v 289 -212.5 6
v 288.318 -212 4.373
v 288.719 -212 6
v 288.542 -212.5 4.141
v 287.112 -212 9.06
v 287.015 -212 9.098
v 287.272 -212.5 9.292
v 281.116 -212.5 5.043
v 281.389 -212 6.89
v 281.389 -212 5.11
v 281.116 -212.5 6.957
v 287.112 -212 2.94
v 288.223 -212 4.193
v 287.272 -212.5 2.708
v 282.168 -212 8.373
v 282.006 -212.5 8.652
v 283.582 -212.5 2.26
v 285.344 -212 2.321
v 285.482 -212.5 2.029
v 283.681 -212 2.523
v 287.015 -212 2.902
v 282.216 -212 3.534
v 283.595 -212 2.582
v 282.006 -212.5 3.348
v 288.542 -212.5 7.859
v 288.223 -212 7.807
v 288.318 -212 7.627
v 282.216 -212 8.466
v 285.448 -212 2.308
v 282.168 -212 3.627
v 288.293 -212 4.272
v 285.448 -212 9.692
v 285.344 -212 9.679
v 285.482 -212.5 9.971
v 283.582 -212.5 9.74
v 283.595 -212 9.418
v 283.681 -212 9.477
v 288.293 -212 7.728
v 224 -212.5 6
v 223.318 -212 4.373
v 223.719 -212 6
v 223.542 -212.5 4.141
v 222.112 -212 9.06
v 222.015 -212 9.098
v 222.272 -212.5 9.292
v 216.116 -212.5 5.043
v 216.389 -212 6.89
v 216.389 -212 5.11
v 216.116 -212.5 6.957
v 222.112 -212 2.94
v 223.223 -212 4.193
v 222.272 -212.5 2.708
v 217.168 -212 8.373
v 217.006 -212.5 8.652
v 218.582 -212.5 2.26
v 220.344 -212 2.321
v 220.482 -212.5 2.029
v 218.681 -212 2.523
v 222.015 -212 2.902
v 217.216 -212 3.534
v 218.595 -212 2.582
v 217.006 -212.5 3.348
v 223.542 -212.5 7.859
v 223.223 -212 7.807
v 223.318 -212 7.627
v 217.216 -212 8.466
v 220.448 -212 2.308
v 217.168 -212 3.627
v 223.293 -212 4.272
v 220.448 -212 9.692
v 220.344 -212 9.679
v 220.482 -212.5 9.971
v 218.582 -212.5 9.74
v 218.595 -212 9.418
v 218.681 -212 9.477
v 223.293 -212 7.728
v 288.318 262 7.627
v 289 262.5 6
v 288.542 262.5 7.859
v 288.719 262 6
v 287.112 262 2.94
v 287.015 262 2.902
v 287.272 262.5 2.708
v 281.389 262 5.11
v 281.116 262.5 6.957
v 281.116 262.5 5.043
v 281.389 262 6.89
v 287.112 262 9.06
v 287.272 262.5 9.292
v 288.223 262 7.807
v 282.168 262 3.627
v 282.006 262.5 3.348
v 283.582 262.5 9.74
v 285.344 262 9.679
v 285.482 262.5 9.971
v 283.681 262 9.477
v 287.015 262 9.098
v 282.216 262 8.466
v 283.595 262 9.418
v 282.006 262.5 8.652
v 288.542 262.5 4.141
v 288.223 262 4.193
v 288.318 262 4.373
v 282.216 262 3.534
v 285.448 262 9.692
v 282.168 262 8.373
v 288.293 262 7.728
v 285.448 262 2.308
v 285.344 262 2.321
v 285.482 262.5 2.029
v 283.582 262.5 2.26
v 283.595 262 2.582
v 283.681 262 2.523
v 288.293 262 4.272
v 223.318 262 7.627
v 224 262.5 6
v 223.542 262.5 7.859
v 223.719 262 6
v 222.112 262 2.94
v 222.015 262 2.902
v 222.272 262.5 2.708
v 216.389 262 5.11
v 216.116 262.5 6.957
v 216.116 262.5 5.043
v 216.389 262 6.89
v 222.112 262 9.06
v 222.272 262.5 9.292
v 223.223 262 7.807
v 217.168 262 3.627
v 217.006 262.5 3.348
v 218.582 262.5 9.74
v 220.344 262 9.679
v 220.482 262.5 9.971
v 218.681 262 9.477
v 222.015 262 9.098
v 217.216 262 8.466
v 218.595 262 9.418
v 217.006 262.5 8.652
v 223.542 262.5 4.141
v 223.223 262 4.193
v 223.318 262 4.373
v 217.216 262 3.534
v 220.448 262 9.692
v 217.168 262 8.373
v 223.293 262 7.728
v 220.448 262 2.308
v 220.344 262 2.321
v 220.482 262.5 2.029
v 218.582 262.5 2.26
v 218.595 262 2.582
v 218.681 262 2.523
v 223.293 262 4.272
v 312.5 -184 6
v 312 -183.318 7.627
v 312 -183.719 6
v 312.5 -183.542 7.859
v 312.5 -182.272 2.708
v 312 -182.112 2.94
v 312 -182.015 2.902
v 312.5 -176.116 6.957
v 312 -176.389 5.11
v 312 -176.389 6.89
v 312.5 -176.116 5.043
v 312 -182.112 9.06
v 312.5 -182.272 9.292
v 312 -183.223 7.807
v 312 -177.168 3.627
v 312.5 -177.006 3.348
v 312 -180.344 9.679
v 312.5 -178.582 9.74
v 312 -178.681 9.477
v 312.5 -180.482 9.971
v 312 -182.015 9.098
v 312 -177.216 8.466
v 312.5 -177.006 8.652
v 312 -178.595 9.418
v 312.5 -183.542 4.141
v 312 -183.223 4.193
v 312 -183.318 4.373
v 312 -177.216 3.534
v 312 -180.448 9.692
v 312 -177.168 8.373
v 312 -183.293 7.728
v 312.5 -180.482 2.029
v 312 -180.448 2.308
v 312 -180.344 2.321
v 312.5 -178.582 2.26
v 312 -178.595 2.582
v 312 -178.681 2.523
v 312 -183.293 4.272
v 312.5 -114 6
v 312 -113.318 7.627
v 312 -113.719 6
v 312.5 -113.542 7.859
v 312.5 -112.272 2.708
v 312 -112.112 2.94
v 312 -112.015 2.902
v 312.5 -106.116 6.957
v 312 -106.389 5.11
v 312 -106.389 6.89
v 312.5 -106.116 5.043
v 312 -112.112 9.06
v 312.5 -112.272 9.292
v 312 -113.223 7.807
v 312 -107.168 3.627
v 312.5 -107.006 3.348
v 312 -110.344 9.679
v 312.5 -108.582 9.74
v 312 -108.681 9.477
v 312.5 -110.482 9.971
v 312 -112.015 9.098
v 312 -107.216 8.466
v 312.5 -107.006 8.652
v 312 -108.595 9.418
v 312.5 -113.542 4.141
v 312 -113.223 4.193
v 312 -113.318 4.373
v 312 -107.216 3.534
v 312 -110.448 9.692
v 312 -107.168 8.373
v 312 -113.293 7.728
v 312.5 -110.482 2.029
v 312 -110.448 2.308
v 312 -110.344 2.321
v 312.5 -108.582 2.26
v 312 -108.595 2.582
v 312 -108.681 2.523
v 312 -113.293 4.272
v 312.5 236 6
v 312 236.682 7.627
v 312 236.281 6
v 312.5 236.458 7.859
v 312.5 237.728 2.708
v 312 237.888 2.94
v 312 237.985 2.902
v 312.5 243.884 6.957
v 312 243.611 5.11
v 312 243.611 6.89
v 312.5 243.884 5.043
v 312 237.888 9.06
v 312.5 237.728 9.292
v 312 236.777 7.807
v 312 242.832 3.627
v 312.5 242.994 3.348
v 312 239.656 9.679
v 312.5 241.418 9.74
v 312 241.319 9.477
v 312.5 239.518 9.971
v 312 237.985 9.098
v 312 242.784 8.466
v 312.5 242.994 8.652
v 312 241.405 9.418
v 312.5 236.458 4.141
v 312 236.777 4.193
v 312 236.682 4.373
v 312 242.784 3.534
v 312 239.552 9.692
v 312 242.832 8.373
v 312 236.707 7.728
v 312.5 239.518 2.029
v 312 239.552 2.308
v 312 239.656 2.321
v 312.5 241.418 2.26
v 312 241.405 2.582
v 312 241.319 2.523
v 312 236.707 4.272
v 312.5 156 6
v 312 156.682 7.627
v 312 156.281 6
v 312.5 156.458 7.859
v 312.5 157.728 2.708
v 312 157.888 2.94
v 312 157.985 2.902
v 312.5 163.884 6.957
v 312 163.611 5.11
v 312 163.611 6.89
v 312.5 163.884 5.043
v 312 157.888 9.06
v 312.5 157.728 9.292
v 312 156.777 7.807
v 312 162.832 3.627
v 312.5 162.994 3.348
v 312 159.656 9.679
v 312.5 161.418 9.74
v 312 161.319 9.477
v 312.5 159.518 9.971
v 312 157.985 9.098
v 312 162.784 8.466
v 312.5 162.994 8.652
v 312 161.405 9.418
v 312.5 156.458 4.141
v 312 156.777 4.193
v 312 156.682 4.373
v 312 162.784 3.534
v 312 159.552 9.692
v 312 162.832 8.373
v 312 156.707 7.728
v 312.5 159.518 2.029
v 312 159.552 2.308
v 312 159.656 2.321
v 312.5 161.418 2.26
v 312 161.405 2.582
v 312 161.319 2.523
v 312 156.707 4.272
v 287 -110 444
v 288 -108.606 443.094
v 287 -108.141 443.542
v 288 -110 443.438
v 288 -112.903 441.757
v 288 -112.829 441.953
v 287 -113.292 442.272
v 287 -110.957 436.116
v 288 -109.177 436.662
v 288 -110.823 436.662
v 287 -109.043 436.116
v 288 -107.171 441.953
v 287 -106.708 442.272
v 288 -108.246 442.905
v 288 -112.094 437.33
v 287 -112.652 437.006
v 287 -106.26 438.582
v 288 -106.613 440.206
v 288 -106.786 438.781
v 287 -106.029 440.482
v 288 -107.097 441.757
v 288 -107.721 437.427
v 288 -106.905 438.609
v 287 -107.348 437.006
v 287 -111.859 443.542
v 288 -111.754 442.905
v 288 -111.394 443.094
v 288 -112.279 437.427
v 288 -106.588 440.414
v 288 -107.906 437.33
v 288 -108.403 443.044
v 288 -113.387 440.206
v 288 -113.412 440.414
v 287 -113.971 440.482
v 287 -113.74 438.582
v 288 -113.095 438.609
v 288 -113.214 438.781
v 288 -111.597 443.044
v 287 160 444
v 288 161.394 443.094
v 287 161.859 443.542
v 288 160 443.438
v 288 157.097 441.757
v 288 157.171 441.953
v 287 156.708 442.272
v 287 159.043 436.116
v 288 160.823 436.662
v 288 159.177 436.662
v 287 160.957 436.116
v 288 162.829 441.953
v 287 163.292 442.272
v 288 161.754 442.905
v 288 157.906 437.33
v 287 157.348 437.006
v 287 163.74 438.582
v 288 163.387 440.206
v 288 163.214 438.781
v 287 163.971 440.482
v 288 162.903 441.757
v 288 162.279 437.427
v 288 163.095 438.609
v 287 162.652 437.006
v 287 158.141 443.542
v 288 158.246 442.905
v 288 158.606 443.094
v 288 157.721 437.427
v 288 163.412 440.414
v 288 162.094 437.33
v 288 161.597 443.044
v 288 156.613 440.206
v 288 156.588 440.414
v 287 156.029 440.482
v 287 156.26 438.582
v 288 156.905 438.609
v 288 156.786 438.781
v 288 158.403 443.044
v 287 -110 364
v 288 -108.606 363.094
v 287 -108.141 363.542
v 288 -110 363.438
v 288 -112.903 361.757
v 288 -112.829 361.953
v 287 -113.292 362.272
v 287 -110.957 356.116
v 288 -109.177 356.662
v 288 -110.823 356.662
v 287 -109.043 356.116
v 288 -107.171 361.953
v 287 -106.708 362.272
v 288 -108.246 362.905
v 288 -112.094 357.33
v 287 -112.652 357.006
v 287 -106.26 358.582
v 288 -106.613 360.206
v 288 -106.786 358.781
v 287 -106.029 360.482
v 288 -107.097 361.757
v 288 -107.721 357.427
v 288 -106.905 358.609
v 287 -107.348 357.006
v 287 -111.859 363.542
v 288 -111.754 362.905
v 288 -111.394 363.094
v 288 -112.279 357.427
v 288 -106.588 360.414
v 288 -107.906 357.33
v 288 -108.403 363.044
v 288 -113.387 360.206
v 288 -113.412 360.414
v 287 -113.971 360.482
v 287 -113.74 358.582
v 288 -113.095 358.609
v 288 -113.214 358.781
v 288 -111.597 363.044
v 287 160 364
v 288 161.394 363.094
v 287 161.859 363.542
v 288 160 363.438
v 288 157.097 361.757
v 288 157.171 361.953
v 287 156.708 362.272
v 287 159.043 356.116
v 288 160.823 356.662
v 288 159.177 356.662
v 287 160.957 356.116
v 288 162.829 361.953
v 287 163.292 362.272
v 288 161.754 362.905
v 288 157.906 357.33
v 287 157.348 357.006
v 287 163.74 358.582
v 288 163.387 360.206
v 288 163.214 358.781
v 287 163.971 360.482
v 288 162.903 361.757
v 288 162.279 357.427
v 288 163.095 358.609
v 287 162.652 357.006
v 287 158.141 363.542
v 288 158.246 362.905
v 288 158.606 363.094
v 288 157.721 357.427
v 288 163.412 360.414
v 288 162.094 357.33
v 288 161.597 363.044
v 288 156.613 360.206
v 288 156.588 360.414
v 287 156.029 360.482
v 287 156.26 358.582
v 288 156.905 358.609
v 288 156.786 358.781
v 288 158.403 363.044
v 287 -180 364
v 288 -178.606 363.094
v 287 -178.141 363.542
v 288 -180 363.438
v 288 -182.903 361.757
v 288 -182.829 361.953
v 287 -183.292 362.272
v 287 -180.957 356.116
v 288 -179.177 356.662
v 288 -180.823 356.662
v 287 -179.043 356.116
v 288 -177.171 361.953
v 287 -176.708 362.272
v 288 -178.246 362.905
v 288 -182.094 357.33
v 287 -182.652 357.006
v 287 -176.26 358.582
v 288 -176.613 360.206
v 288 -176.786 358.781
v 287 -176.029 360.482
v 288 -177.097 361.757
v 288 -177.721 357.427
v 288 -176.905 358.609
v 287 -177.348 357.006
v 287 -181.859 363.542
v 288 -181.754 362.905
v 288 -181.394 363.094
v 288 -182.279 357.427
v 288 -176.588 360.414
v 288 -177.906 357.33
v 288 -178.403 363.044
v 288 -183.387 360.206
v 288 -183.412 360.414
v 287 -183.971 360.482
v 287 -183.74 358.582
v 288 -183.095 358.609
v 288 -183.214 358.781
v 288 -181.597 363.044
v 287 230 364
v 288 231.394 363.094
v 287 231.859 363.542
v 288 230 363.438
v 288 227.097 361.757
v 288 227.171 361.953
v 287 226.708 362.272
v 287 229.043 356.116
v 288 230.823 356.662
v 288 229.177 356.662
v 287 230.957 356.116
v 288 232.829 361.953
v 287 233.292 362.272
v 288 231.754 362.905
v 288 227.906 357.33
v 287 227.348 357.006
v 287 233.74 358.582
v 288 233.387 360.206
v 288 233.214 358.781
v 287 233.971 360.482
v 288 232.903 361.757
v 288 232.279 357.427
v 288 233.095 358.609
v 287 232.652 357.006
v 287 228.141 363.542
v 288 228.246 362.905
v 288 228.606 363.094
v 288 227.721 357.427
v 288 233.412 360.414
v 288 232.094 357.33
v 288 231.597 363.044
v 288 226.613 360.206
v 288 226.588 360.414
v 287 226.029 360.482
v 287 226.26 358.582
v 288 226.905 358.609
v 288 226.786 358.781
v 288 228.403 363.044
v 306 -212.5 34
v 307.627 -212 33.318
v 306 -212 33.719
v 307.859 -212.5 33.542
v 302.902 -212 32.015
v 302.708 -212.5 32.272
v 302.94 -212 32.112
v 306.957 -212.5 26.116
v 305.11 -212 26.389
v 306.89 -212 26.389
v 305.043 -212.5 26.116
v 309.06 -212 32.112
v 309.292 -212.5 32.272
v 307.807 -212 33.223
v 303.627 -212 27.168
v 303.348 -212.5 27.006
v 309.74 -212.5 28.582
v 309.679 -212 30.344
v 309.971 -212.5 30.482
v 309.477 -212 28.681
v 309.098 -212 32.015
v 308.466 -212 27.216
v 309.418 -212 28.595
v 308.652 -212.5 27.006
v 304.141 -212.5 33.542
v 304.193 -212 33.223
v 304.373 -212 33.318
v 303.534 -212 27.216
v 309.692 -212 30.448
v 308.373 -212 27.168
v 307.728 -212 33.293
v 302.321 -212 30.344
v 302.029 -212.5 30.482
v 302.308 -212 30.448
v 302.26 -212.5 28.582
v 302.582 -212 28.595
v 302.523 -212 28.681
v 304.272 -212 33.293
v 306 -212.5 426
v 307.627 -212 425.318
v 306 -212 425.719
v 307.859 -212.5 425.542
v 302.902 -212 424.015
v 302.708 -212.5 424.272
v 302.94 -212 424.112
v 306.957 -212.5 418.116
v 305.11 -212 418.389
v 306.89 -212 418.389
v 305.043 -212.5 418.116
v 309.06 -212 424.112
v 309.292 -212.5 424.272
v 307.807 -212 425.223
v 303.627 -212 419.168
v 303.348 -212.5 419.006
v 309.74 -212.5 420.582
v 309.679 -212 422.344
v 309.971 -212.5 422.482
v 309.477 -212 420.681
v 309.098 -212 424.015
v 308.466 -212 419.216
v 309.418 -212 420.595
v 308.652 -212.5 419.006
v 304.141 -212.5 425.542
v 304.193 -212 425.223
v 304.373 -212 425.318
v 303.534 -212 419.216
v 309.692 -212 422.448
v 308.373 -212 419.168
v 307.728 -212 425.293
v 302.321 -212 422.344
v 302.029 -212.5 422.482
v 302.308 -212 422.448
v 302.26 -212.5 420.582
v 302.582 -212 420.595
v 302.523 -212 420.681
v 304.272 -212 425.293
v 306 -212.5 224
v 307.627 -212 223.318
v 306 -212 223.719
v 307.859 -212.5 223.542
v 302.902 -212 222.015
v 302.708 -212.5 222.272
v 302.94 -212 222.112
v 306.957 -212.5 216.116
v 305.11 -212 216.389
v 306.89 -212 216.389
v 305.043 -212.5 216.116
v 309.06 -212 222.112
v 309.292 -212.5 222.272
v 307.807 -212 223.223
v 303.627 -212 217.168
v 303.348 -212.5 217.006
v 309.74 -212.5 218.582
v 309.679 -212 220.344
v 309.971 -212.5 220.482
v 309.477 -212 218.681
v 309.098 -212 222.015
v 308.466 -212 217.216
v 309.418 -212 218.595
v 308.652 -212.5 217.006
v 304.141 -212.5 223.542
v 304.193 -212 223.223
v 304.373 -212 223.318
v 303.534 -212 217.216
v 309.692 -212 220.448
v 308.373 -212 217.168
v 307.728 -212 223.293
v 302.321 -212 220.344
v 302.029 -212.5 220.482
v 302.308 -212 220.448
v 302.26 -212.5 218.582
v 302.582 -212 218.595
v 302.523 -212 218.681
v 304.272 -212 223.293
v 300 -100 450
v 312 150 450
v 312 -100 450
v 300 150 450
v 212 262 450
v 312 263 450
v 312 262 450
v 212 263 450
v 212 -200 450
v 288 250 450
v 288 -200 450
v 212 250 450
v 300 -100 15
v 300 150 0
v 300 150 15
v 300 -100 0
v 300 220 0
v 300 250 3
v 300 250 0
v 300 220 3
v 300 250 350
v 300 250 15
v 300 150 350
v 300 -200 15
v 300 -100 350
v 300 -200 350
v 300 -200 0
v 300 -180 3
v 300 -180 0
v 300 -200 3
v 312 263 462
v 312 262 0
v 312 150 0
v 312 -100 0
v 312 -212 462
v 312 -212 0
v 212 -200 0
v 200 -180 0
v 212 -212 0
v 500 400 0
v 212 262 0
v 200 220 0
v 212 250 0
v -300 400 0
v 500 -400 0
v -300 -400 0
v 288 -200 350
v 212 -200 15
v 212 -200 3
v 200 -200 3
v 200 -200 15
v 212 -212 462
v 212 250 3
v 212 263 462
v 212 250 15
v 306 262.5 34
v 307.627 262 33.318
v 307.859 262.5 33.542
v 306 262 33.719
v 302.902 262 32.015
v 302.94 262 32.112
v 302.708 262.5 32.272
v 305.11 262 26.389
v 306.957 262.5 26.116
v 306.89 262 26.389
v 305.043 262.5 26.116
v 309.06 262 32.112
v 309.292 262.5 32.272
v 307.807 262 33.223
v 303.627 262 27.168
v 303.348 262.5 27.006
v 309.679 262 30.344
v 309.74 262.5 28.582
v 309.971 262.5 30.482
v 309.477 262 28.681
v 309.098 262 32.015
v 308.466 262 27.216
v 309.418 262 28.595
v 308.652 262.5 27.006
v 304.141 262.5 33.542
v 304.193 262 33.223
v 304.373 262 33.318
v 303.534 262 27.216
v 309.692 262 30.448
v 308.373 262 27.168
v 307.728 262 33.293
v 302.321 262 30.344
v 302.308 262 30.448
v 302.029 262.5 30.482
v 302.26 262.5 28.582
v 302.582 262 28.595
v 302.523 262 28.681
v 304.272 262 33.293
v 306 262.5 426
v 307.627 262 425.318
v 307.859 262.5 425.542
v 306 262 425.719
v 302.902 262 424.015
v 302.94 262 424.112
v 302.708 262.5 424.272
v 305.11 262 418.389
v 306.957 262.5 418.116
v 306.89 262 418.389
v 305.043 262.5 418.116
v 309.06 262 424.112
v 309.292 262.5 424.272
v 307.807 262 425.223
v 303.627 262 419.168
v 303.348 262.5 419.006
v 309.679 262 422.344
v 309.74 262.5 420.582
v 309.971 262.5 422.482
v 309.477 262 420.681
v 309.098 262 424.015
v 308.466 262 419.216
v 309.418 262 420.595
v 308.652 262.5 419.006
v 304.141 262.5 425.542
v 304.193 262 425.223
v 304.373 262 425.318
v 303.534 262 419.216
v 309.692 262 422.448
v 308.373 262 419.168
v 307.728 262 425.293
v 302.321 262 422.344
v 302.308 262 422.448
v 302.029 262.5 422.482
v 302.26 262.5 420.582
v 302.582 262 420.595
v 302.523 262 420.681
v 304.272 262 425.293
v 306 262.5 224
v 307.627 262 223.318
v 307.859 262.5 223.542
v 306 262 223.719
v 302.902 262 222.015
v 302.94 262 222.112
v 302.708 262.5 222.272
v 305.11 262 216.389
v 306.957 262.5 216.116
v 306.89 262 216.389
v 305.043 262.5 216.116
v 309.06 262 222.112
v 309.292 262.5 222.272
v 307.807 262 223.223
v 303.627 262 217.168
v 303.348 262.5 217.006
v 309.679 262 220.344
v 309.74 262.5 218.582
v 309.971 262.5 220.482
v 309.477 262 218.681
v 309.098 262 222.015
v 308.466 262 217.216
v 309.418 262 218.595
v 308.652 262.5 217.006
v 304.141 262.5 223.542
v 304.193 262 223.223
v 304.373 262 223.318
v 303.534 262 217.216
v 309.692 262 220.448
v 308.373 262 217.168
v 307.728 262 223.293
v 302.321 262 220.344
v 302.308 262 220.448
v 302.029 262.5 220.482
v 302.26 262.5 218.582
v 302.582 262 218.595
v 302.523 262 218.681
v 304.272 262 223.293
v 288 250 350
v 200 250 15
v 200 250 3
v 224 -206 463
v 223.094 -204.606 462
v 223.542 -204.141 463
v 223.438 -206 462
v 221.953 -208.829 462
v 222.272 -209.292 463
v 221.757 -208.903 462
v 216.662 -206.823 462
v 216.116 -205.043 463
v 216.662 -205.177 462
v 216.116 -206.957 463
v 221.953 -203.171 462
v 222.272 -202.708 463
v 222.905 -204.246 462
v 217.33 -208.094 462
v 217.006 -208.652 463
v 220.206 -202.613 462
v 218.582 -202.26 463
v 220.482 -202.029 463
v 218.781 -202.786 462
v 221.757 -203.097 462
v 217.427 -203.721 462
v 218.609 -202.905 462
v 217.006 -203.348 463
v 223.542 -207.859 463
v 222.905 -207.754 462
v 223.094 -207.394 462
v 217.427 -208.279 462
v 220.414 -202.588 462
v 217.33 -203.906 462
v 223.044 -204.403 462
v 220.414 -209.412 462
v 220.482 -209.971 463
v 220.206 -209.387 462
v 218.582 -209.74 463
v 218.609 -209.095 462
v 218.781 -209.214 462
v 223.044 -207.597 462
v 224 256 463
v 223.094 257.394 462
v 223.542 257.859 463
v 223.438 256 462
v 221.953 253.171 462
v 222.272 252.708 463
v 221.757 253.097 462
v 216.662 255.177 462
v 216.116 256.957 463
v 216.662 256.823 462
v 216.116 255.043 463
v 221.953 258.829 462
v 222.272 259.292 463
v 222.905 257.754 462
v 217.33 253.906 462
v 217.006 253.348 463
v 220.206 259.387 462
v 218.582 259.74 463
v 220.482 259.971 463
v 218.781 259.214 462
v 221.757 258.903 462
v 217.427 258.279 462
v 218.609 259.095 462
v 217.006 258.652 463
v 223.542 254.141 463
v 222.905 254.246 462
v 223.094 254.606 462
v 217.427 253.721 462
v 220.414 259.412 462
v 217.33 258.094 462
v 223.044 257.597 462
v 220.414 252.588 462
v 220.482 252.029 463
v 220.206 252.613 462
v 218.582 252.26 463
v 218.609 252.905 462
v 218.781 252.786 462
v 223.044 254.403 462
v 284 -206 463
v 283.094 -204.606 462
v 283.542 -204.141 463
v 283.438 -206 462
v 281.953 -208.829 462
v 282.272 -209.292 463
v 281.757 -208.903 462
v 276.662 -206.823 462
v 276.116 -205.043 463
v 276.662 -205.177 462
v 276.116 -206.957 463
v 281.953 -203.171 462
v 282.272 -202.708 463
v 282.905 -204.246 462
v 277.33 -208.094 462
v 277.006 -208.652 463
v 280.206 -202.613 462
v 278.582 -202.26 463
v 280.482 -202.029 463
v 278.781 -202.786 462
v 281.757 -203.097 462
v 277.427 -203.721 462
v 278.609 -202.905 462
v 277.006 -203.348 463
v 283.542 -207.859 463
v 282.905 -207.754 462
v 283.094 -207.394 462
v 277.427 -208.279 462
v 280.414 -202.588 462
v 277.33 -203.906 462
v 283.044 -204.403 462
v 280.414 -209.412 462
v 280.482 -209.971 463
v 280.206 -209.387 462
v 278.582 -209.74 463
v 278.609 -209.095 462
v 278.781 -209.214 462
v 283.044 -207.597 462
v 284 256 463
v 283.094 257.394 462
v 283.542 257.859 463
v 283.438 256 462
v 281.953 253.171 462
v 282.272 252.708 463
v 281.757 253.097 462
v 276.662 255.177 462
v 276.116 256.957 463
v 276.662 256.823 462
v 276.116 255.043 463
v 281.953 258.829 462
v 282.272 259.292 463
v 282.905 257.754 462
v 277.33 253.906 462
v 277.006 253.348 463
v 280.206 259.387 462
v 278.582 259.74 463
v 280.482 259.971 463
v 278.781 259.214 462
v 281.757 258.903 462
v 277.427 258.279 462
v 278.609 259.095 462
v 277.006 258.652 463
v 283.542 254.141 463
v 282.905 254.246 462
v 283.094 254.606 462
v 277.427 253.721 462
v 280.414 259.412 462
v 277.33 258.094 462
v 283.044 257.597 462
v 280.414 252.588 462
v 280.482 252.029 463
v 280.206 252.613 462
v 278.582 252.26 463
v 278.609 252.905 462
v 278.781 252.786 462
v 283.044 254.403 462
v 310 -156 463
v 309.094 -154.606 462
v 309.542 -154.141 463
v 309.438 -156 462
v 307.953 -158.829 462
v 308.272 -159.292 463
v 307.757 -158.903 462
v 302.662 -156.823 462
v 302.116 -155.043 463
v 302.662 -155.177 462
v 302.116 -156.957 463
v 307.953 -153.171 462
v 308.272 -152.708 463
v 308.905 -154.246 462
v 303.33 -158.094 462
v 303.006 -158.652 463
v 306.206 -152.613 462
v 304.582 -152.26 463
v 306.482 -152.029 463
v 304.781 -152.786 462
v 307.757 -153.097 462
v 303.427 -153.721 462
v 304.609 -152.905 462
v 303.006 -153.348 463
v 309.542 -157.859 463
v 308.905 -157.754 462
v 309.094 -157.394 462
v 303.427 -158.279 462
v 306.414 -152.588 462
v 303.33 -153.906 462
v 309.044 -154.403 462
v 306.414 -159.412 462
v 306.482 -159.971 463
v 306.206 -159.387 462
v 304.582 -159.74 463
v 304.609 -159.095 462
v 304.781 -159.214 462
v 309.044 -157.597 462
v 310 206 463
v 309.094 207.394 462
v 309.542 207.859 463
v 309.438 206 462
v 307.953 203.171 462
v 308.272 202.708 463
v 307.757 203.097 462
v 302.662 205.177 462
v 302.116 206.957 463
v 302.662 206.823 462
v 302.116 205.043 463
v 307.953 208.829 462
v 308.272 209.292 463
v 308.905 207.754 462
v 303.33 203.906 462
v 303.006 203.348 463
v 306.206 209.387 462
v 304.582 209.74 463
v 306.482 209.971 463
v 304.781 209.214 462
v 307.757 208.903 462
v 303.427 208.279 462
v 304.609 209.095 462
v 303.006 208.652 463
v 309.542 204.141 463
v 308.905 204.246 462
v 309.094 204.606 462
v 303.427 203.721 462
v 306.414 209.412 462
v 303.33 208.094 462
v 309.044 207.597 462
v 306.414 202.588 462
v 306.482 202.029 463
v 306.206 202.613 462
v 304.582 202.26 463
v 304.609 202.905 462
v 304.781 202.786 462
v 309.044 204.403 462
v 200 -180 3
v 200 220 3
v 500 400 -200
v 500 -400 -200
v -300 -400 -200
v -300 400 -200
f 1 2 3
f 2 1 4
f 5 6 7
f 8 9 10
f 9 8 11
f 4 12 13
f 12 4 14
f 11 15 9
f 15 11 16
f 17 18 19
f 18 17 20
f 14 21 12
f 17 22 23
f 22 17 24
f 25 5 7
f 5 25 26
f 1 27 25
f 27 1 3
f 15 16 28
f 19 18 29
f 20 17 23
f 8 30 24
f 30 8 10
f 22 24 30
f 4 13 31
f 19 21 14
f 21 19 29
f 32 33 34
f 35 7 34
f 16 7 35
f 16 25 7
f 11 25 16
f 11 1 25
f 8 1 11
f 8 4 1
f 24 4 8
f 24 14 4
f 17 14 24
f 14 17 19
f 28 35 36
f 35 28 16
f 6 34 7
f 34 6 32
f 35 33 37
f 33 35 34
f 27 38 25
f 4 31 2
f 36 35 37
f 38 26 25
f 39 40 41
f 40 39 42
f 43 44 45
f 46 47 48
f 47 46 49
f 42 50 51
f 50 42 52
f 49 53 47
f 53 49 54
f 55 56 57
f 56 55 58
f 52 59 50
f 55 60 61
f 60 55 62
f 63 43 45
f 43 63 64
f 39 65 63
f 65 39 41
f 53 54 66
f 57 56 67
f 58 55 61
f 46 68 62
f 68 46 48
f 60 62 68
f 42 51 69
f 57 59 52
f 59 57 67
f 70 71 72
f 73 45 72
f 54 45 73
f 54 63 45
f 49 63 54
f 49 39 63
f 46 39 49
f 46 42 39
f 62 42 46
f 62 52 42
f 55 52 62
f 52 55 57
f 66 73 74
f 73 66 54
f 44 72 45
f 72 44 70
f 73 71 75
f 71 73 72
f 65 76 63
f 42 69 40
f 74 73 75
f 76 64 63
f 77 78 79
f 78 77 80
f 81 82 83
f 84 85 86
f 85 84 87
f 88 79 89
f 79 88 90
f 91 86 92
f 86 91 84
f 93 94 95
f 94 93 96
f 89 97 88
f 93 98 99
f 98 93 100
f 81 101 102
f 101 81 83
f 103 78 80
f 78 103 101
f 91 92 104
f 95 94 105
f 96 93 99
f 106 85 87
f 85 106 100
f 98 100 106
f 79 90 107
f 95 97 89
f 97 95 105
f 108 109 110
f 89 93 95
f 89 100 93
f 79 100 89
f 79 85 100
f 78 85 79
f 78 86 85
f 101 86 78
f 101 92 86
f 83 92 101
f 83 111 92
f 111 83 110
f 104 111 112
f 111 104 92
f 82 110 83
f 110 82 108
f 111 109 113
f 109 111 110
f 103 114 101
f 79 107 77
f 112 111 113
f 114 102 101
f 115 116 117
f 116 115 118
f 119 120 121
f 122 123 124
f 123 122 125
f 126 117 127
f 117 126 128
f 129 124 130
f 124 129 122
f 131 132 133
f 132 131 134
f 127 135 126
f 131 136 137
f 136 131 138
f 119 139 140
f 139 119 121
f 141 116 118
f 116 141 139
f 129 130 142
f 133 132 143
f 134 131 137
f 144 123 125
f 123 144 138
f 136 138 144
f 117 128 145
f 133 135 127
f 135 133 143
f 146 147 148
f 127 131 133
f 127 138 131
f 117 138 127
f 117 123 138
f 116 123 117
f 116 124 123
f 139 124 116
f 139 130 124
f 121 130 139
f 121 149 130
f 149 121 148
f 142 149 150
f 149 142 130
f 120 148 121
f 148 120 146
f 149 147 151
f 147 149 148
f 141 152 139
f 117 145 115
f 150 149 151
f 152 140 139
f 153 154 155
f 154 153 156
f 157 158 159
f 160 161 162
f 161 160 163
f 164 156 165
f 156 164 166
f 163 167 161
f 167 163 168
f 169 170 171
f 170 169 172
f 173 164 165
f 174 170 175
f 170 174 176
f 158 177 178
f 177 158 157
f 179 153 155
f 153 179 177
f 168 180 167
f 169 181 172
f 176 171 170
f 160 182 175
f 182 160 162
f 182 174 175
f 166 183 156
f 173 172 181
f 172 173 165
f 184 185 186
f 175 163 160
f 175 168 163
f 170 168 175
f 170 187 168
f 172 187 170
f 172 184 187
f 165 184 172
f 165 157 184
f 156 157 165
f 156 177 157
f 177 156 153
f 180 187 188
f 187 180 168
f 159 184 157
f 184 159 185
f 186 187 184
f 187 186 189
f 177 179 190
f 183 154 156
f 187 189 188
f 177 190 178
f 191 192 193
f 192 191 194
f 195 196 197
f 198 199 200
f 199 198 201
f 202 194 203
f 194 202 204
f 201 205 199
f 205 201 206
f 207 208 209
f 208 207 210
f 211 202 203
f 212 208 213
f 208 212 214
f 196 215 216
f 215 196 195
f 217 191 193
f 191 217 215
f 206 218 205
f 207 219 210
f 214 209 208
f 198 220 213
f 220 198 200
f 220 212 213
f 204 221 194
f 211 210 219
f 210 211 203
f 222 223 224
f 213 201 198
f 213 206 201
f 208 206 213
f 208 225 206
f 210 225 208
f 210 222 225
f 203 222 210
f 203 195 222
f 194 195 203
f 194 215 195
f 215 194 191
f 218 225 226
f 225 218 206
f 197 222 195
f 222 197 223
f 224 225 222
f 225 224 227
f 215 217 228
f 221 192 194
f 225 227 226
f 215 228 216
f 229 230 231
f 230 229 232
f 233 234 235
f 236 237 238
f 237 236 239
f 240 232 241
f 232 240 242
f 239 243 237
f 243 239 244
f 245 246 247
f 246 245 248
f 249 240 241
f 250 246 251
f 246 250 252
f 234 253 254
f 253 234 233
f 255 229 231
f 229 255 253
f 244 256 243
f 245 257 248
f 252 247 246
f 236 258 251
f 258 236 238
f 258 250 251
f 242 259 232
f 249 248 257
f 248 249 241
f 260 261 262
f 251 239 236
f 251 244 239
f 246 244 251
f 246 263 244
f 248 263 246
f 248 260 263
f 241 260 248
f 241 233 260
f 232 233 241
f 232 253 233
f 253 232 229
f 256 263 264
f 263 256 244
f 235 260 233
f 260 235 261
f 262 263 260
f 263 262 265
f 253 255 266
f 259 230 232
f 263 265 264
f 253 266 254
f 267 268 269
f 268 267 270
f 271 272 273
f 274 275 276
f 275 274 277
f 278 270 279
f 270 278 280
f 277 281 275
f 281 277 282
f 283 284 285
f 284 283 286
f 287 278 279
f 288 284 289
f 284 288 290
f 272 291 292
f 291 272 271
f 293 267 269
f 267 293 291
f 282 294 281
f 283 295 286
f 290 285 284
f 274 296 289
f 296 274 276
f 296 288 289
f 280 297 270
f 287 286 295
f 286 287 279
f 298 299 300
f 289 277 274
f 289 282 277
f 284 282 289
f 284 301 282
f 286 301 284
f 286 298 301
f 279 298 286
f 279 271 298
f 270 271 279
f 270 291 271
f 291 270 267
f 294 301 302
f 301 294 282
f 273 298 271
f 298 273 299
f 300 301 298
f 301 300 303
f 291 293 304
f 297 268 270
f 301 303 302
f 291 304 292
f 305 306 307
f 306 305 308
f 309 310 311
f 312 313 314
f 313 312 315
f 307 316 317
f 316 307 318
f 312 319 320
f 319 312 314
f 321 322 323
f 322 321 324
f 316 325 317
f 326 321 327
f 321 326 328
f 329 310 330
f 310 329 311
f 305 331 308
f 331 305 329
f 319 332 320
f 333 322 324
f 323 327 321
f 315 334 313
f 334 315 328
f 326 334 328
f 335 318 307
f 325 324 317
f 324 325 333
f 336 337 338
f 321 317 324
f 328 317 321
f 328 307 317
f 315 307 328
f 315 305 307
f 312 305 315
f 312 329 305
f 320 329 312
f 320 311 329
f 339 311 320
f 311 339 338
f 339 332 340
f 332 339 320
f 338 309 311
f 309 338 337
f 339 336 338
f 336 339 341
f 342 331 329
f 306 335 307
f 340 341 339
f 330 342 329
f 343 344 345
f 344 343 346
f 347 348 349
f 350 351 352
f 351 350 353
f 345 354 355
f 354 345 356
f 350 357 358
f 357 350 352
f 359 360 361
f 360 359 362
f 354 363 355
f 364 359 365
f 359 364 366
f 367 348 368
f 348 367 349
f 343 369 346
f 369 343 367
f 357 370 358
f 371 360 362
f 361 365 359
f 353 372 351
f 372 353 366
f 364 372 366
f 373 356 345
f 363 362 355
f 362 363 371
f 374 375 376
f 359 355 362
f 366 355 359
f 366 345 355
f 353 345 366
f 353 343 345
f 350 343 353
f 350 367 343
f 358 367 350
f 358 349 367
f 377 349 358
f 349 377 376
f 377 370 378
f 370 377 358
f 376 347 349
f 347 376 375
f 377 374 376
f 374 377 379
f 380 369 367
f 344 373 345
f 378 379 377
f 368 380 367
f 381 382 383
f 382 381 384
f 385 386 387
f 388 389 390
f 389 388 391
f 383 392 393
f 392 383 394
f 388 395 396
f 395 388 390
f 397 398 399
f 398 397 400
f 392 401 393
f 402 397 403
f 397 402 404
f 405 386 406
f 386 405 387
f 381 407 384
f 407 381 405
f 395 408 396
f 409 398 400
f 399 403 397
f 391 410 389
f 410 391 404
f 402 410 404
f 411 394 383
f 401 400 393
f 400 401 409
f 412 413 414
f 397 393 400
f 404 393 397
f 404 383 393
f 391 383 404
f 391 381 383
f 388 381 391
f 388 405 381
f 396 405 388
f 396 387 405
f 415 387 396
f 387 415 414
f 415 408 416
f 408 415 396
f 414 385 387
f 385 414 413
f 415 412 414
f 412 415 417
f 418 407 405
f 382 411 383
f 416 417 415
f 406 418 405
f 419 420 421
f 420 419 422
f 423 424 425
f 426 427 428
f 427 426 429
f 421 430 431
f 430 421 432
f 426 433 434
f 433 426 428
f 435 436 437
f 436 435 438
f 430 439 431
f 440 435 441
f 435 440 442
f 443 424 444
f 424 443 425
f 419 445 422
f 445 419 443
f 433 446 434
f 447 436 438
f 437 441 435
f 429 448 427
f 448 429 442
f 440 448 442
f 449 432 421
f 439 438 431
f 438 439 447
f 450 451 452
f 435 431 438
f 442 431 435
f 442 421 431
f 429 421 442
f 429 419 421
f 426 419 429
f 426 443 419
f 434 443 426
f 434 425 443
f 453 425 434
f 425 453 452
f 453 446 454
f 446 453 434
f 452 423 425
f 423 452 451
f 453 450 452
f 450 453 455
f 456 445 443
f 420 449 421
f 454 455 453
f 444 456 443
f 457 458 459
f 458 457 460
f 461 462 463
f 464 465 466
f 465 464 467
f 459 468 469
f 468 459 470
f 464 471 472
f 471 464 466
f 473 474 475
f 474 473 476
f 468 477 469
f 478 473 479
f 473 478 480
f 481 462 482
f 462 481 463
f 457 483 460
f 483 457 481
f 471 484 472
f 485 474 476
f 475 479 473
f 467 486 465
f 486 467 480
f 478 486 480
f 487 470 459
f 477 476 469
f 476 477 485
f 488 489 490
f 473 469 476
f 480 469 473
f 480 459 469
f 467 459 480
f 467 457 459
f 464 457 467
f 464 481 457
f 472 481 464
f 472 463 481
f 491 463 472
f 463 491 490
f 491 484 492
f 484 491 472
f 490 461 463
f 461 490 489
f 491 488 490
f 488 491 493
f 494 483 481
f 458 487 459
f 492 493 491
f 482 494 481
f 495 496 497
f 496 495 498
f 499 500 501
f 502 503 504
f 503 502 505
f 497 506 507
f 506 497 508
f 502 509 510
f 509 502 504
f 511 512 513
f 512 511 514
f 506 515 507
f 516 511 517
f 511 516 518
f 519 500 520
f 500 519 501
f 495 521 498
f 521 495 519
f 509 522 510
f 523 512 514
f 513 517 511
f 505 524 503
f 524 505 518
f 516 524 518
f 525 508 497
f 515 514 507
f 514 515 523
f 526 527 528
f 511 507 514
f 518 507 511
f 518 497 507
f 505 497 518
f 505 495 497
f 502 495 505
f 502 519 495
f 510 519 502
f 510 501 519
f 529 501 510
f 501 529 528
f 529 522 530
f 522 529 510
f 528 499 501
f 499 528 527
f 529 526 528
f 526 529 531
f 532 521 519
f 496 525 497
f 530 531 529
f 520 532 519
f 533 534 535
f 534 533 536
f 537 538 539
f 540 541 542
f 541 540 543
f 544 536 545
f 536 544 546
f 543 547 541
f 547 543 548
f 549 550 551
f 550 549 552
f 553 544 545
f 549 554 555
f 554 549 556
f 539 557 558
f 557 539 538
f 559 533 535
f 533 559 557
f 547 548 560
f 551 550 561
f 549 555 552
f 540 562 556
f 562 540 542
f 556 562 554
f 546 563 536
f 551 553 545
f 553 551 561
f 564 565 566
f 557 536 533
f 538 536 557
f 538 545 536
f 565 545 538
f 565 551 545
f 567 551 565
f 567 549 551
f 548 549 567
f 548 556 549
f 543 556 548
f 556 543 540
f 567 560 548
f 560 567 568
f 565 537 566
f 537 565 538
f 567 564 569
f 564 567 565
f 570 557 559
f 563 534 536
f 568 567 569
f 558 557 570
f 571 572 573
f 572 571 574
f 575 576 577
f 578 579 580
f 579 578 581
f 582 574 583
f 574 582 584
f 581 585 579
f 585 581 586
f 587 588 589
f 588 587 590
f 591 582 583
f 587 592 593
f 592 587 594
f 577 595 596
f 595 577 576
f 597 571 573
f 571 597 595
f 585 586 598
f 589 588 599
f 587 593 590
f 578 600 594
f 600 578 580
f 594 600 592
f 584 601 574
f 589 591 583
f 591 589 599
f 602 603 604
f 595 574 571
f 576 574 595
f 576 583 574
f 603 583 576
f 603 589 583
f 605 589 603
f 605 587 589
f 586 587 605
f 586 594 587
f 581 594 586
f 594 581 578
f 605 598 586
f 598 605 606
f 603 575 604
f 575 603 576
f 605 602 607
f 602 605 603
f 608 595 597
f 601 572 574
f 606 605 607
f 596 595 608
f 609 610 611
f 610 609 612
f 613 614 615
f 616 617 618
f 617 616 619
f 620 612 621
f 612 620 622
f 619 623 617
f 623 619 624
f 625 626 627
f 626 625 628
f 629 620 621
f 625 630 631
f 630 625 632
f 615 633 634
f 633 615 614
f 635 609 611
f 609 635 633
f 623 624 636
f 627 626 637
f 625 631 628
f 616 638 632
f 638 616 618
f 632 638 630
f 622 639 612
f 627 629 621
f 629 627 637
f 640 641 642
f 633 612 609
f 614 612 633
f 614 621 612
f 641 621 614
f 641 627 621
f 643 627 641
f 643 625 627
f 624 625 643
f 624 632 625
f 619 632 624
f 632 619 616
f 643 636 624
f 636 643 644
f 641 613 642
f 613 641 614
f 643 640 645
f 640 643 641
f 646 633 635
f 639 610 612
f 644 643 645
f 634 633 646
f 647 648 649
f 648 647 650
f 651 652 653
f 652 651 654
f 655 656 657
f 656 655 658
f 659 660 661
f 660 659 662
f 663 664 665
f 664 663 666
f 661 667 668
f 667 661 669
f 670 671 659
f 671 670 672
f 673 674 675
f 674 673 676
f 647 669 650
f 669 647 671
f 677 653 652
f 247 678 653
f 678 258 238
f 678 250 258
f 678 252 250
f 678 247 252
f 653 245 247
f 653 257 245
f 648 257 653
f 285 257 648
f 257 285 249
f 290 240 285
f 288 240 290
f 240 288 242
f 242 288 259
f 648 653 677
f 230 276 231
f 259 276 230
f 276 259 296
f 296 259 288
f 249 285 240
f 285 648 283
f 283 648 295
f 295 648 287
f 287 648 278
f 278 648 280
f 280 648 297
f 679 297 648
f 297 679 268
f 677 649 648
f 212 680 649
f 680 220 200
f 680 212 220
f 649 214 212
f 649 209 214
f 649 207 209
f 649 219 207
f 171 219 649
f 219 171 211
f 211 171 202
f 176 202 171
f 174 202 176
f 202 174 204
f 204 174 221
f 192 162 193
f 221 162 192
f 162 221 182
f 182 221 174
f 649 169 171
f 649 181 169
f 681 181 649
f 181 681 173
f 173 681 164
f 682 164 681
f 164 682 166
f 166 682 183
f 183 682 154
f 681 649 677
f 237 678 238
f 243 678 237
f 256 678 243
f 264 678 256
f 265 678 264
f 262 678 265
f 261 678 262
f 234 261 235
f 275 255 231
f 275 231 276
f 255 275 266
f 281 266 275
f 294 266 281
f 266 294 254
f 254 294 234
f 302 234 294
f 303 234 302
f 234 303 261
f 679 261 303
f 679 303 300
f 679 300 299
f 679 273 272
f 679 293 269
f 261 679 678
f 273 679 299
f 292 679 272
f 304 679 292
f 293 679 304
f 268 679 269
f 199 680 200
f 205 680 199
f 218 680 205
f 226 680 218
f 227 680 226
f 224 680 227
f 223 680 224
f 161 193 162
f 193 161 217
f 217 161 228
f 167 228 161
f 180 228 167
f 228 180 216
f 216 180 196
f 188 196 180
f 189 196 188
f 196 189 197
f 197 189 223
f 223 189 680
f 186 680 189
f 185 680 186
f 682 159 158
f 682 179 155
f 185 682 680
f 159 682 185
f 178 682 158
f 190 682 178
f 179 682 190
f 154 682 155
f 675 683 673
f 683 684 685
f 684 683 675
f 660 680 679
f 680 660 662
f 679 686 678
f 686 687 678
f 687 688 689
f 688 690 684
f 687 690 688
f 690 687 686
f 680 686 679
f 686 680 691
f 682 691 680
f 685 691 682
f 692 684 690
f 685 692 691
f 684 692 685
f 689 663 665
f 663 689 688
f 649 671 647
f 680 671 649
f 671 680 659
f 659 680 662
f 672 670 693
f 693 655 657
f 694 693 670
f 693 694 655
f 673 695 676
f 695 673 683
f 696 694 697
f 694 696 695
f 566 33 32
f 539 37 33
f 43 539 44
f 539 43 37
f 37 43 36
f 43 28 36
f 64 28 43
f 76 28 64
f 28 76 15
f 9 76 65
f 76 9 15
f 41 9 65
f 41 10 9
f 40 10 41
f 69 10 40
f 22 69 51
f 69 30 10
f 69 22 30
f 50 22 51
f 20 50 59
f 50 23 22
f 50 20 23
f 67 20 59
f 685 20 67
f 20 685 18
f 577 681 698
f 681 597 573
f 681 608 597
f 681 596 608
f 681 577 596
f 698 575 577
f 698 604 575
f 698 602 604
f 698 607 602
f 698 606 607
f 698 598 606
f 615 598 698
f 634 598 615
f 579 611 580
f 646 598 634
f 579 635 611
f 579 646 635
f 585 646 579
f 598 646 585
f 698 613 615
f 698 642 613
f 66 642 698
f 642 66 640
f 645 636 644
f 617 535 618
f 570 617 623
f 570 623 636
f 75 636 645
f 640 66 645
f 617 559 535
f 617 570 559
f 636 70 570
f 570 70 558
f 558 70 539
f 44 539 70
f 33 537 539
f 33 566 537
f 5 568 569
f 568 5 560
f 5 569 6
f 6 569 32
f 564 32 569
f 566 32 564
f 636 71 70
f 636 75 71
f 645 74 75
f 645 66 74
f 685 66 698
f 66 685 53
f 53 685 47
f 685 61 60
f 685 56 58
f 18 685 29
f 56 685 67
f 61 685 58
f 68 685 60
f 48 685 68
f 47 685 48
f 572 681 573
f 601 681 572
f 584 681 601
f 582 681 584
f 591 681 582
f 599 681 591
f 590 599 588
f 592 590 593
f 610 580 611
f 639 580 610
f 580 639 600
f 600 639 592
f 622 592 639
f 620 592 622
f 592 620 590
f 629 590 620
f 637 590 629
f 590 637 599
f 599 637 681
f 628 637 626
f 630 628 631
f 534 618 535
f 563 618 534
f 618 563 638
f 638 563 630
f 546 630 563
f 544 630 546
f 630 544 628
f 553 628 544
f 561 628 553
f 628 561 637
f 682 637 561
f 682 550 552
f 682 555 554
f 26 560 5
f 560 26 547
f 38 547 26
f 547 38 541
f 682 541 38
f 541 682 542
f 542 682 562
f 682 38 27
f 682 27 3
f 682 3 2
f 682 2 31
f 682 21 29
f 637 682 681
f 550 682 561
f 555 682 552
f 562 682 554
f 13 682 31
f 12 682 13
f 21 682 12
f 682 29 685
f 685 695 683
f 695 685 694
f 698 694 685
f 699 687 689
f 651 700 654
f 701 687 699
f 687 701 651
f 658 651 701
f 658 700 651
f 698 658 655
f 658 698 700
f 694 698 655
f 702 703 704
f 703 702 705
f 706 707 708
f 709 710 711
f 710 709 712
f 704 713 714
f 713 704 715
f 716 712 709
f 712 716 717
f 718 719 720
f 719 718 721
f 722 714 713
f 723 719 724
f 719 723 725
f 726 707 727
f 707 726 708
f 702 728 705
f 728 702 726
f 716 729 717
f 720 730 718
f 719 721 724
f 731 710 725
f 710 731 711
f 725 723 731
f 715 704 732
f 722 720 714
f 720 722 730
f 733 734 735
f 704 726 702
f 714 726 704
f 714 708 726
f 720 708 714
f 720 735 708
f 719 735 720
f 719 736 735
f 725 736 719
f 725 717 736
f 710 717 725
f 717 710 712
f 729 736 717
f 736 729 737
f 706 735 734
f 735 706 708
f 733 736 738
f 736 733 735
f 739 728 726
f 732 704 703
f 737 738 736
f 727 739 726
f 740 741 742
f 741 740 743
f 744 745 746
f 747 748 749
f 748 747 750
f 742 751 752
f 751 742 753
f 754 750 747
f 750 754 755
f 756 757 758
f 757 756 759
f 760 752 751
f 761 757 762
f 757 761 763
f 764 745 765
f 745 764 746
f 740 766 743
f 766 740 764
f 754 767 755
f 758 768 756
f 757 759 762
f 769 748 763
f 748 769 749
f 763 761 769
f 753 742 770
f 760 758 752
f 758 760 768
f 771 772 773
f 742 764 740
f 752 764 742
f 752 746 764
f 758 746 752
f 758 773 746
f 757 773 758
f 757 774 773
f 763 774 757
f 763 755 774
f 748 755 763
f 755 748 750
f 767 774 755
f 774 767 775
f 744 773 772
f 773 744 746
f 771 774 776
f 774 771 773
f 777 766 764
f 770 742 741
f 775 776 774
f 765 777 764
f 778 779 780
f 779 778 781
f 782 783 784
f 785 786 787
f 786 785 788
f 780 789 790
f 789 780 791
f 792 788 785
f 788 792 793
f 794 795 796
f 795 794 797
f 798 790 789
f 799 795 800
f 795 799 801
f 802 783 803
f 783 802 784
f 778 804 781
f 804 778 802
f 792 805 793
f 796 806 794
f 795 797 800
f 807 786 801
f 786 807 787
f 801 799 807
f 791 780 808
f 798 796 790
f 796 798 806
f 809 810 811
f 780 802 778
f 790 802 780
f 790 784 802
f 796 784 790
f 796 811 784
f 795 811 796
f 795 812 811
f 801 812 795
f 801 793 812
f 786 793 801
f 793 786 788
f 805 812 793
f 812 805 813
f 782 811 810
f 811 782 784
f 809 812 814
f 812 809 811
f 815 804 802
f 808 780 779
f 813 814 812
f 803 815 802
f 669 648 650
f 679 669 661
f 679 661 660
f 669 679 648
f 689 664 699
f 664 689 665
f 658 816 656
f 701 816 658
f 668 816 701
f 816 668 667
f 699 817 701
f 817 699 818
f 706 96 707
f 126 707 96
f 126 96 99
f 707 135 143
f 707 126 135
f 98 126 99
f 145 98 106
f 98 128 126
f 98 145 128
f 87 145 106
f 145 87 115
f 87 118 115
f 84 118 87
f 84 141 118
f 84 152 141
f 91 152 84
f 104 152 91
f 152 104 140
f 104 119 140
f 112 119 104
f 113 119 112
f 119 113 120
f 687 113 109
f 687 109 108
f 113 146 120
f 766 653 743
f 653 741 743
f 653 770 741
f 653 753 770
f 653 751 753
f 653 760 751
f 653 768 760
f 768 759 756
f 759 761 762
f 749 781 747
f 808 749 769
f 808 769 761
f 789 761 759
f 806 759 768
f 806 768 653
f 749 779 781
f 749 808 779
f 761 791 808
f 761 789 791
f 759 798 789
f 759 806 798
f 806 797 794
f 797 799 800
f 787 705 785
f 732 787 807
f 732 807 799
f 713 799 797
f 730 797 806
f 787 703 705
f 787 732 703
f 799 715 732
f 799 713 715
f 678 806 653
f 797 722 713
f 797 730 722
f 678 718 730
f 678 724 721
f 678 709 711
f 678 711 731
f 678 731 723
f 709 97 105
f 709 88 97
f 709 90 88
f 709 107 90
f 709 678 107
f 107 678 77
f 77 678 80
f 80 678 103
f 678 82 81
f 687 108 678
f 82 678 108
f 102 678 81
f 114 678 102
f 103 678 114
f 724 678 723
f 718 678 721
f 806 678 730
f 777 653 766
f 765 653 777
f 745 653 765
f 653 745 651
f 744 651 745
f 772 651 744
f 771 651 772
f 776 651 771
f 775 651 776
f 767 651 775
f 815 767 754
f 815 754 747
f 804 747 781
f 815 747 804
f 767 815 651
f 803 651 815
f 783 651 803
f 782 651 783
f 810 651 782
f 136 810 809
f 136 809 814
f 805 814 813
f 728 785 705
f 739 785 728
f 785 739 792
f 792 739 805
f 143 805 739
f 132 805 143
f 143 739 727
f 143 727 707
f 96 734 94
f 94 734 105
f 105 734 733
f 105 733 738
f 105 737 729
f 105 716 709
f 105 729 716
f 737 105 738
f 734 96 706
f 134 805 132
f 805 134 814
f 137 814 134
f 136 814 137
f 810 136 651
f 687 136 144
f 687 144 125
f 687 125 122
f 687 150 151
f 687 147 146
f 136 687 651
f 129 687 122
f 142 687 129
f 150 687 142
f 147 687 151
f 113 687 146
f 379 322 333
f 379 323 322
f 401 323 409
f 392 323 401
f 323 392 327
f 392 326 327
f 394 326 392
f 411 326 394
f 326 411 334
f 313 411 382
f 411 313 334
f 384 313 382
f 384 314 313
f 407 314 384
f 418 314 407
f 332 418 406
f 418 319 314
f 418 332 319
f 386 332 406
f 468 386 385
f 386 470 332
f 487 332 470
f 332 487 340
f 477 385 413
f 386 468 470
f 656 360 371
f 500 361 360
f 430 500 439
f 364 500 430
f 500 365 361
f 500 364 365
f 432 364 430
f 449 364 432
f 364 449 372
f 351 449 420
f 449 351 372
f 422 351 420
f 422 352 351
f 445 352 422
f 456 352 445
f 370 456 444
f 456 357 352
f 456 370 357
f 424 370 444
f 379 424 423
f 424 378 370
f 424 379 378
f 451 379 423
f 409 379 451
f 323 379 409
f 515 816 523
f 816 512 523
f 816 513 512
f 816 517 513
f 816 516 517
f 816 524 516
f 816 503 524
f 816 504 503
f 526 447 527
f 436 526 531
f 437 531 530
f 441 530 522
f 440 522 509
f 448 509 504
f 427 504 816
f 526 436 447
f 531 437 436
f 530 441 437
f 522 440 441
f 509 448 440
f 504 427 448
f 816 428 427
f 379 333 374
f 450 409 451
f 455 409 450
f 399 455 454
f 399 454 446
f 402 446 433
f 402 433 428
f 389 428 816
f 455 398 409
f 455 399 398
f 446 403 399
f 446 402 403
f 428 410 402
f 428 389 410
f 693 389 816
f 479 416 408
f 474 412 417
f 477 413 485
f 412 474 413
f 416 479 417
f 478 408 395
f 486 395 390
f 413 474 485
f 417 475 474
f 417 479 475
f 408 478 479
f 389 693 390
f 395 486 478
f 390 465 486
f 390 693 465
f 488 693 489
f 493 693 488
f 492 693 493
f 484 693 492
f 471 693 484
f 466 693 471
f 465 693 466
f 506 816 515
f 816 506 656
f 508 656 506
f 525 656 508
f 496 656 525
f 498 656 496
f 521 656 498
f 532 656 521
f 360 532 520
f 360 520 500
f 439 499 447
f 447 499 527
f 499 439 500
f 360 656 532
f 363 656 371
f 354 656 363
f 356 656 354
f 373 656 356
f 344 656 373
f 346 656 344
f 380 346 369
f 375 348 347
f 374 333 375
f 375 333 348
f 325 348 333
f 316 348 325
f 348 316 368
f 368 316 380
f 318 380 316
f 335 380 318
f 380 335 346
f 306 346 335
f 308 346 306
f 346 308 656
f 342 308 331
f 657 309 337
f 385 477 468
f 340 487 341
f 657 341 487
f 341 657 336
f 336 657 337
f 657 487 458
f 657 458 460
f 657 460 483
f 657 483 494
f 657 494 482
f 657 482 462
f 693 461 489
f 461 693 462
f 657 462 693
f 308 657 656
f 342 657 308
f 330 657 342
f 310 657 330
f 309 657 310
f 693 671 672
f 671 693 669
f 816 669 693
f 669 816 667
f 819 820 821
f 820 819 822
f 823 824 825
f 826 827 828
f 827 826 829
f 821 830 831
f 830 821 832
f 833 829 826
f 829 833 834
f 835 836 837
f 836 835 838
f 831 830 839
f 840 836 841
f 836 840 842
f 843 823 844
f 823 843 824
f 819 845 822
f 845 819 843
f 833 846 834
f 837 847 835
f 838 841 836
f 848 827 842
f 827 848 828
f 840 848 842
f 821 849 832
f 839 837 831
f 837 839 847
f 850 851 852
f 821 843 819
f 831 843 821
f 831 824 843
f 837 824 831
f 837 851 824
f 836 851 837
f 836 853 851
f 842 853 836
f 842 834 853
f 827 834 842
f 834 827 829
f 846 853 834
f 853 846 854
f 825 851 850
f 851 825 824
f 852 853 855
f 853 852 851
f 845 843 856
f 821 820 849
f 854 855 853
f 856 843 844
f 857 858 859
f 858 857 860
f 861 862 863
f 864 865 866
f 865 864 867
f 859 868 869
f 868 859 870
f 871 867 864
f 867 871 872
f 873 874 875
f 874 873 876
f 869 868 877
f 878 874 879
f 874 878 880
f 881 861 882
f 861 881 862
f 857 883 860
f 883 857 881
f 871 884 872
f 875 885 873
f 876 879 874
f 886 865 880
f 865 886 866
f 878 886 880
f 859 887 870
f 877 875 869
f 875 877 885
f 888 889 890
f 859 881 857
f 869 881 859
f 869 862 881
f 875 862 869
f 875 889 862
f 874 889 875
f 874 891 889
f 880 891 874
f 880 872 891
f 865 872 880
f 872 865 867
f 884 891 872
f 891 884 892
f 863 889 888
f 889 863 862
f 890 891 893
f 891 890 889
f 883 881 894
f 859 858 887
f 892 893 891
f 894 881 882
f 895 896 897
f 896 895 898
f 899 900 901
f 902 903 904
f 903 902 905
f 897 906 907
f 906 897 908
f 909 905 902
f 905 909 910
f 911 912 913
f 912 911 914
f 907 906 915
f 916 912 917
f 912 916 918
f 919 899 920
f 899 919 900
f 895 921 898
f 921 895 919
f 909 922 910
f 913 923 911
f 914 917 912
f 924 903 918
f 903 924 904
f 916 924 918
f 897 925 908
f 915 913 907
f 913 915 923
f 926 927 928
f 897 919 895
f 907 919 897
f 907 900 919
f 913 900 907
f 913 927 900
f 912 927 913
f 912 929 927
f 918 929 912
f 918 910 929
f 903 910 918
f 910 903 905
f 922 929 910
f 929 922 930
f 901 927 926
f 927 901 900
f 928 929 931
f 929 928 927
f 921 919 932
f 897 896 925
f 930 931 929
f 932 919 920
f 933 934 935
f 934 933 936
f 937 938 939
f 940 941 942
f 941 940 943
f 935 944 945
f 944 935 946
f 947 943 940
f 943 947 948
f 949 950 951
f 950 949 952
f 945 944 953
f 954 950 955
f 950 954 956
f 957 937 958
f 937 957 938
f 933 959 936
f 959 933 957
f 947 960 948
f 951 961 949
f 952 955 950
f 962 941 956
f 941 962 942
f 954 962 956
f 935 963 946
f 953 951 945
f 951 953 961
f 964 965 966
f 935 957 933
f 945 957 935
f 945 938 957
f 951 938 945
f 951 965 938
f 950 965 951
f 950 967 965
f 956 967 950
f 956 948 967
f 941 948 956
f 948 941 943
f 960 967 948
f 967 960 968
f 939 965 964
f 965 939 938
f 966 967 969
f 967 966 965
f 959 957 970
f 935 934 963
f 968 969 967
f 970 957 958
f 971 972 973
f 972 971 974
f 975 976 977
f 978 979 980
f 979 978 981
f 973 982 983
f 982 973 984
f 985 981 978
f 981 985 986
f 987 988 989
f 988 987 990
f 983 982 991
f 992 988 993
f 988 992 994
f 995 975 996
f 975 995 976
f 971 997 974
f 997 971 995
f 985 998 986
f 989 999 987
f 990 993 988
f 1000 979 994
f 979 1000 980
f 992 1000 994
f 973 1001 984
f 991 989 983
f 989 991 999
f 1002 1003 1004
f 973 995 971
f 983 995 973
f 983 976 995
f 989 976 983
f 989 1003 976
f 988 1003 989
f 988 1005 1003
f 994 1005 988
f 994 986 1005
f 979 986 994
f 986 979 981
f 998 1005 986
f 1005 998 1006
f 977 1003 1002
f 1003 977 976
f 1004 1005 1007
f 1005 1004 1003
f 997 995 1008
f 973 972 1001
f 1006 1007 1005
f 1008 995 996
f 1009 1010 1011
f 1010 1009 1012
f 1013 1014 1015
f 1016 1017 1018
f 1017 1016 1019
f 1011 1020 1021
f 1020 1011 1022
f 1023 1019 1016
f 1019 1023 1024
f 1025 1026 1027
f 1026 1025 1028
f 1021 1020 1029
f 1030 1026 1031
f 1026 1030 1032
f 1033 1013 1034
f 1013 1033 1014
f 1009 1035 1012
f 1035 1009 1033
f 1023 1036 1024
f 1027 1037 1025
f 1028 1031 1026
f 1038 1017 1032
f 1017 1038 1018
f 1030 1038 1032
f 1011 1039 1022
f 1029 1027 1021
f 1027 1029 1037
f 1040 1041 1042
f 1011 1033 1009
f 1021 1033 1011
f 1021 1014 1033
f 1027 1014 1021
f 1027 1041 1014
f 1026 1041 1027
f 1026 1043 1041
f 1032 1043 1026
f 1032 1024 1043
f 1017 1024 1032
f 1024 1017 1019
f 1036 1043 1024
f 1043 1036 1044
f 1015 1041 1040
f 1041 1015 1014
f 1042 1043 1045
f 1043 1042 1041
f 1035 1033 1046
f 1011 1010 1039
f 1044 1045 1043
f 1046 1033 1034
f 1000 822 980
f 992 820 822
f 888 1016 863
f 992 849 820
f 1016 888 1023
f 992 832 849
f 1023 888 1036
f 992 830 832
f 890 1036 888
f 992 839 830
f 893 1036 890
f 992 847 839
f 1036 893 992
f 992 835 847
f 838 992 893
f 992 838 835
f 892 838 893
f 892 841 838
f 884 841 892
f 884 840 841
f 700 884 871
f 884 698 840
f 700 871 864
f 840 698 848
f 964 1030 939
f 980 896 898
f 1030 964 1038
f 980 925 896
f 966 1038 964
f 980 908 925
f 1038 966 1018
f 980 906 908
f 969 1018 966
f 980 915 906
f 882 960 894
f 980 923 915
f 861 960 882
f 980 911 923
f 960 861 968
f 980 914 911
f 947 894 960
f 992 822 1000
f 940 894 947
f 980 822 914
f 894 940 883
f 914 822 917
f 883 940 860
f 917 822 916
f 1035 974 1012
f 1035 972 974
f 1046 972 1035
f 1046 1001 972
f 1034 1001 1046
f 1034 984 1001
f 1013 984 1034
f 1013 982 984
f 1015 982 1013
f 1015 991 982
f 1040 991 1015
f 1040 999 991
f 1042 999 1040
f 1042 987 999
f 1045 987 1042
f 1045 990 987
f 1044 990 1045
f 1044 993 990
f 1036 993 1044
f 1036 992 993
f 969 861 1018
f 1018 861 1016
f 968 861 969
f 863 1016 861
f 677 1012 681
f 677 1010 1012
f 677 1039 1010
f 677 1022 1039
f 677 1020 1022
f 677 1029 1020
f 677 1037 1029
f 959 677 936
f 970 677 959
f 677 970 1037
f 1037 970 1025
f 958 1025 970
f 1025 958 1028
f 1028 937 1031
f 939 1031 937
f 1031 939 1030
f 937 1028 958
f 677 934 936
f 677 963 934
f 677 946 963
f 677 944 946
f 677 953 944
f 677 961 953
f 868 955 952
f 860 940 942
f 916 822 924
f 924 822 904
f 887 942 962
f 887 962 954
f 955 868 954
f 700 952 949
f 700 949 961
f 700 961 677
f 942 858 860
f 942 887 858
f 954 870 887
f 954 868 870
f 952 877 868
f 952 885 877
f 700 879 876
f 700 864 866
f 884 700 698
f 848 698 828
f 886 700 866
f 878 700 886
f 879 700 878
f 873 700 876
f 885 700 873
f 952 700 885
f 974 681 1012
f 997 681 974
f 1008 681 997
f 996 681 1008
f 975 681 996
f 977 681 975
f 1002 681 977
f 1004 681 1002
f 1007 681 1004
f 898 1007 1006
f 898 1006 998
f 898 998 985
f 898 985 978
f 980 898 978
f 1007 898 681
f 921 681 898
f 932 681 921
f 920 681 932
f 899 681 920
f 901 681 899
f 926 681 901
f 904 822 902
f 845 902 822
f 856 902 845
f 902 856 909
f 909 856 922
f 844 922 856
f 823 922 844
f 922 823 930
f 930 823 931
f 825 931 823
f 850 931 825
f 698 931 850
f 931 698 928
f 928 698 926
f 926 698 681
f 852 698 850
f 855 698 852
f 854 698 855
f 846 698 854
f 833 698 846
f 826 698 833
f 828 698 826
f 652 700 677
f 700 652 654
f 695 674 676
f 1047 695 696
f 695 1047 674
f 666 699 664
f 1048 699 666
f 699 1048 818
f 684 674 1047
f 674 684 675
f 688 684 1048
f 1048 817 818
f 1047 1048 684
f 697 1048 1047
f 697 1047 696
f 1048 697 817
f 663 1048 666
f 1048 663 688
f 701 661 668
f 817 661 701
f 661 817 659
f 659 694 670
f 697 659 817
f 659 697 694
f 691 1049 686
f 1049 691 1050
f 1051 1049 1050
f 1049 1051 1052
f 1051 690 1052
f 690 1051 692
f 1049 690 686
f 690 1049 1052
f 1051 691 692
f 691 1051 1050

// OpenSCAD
module pl(x=100,y=100,z=12){
	cube([x,y,z]);
}
module screw(depth=20){
	color([1,1,0]){
		cylinder(r1=4,r2=3.5/2,h=4);
		cylinder(r1=3.5/2,r2=3.5/2,h=depth-2);
		translate([0,0,depth-2])cylinder(r1=3.5/2,r2=0,h=2);
		
	}
	
}
module p3bscorner(){
translate([30,-12.5,6])rotate([-90,0,0])screw();
translate([422,-12.5,6])rotate([-90,0,0])screw();
translate([220,-12.5,6])rotate([-90,0,0])screw();
//front board vertical
color([0.5,0.5,0.5,0.8])pl(x=450);
//side board
color([0.5,0.5,0.6,0.8])rotate([90,0,0])pl(x=450);
}
module p3bsgantry(){
//side and front boards
translate([440,-110,25])mirror([0,0,1])screw();
translate([440,110+50,25])mirror([0,0,1])screw();
translate([360,-110,25])mirror([0,0,1])screw();
translate([360,110+50,25])mirror([0,0,1])screw();
translate([360,-180,25])mirror([0,0,1])screw();
translate([360,180+50,25])mirror([0,0,1])screw();
//front board across
color([0.5,0.5,0.6,0.9])translate([450,-200,12])rotate([0,0,90])pl(x=450);
translate([0,-200,0])color([0,0,0,0.3])p3bscorner();
translate([0,250,0])color([0,0,0,0.3])mirror([0,1,0])p3bscorner();
}
module boxframe(top=false){
translate([285,-212.5,6])rotate([-90,0,0])screw();
translate([220,-212.5,6])rotate([-90,0,0])screw();
translate([285,262.5,6])rotate([90,0,0])screw();
translate([220,262.5,6])rotate([90,0,0])screw();
translate([312.5,-180,6])rotate([90,0,-90])screw();
translate([312.5,-110,6])rotate([90,0,-90])screw();
translate([312.5,240,6])rotate([90,0,-90])screw();
translate([312.5,160,6])rotate([90,0,-90])screw();

translate([300,-180,0])rotate([0,0,90])color([1,0,0,0.35])pl(x=400,z=3);
//bottom board
translate([300,-200,3])rotate([0,0,90])color([0,0,1,0.55])pl(x=450);
translate([312,0])rotate([0,-90,0])color([0,0,0,0.4])p3bsgantry();
if(top){
translate([220,-206,463])mirror([0,0,1])screw();
translate([220,256,463])mirror([0,0,1])screw();
translate([280,-206,463])mirror([0,0,1])screw();
translate([280,256,463])mirror([0,0,1])screw();
translate([306,-156,463])mirror([0,0,1])screw();
translate([306,206,463])mirror([0,0,1])screw();
//top board
translate([312,-212,450])rotate([0,0,90])color([0,0,1,0.55])pl(x=475);

}
}

color([0,0,0,0.4])boxframe(true);

color([0.8,0.8,0.2,0.35])translate([100,0,-100])cube([800,800,200],true);
